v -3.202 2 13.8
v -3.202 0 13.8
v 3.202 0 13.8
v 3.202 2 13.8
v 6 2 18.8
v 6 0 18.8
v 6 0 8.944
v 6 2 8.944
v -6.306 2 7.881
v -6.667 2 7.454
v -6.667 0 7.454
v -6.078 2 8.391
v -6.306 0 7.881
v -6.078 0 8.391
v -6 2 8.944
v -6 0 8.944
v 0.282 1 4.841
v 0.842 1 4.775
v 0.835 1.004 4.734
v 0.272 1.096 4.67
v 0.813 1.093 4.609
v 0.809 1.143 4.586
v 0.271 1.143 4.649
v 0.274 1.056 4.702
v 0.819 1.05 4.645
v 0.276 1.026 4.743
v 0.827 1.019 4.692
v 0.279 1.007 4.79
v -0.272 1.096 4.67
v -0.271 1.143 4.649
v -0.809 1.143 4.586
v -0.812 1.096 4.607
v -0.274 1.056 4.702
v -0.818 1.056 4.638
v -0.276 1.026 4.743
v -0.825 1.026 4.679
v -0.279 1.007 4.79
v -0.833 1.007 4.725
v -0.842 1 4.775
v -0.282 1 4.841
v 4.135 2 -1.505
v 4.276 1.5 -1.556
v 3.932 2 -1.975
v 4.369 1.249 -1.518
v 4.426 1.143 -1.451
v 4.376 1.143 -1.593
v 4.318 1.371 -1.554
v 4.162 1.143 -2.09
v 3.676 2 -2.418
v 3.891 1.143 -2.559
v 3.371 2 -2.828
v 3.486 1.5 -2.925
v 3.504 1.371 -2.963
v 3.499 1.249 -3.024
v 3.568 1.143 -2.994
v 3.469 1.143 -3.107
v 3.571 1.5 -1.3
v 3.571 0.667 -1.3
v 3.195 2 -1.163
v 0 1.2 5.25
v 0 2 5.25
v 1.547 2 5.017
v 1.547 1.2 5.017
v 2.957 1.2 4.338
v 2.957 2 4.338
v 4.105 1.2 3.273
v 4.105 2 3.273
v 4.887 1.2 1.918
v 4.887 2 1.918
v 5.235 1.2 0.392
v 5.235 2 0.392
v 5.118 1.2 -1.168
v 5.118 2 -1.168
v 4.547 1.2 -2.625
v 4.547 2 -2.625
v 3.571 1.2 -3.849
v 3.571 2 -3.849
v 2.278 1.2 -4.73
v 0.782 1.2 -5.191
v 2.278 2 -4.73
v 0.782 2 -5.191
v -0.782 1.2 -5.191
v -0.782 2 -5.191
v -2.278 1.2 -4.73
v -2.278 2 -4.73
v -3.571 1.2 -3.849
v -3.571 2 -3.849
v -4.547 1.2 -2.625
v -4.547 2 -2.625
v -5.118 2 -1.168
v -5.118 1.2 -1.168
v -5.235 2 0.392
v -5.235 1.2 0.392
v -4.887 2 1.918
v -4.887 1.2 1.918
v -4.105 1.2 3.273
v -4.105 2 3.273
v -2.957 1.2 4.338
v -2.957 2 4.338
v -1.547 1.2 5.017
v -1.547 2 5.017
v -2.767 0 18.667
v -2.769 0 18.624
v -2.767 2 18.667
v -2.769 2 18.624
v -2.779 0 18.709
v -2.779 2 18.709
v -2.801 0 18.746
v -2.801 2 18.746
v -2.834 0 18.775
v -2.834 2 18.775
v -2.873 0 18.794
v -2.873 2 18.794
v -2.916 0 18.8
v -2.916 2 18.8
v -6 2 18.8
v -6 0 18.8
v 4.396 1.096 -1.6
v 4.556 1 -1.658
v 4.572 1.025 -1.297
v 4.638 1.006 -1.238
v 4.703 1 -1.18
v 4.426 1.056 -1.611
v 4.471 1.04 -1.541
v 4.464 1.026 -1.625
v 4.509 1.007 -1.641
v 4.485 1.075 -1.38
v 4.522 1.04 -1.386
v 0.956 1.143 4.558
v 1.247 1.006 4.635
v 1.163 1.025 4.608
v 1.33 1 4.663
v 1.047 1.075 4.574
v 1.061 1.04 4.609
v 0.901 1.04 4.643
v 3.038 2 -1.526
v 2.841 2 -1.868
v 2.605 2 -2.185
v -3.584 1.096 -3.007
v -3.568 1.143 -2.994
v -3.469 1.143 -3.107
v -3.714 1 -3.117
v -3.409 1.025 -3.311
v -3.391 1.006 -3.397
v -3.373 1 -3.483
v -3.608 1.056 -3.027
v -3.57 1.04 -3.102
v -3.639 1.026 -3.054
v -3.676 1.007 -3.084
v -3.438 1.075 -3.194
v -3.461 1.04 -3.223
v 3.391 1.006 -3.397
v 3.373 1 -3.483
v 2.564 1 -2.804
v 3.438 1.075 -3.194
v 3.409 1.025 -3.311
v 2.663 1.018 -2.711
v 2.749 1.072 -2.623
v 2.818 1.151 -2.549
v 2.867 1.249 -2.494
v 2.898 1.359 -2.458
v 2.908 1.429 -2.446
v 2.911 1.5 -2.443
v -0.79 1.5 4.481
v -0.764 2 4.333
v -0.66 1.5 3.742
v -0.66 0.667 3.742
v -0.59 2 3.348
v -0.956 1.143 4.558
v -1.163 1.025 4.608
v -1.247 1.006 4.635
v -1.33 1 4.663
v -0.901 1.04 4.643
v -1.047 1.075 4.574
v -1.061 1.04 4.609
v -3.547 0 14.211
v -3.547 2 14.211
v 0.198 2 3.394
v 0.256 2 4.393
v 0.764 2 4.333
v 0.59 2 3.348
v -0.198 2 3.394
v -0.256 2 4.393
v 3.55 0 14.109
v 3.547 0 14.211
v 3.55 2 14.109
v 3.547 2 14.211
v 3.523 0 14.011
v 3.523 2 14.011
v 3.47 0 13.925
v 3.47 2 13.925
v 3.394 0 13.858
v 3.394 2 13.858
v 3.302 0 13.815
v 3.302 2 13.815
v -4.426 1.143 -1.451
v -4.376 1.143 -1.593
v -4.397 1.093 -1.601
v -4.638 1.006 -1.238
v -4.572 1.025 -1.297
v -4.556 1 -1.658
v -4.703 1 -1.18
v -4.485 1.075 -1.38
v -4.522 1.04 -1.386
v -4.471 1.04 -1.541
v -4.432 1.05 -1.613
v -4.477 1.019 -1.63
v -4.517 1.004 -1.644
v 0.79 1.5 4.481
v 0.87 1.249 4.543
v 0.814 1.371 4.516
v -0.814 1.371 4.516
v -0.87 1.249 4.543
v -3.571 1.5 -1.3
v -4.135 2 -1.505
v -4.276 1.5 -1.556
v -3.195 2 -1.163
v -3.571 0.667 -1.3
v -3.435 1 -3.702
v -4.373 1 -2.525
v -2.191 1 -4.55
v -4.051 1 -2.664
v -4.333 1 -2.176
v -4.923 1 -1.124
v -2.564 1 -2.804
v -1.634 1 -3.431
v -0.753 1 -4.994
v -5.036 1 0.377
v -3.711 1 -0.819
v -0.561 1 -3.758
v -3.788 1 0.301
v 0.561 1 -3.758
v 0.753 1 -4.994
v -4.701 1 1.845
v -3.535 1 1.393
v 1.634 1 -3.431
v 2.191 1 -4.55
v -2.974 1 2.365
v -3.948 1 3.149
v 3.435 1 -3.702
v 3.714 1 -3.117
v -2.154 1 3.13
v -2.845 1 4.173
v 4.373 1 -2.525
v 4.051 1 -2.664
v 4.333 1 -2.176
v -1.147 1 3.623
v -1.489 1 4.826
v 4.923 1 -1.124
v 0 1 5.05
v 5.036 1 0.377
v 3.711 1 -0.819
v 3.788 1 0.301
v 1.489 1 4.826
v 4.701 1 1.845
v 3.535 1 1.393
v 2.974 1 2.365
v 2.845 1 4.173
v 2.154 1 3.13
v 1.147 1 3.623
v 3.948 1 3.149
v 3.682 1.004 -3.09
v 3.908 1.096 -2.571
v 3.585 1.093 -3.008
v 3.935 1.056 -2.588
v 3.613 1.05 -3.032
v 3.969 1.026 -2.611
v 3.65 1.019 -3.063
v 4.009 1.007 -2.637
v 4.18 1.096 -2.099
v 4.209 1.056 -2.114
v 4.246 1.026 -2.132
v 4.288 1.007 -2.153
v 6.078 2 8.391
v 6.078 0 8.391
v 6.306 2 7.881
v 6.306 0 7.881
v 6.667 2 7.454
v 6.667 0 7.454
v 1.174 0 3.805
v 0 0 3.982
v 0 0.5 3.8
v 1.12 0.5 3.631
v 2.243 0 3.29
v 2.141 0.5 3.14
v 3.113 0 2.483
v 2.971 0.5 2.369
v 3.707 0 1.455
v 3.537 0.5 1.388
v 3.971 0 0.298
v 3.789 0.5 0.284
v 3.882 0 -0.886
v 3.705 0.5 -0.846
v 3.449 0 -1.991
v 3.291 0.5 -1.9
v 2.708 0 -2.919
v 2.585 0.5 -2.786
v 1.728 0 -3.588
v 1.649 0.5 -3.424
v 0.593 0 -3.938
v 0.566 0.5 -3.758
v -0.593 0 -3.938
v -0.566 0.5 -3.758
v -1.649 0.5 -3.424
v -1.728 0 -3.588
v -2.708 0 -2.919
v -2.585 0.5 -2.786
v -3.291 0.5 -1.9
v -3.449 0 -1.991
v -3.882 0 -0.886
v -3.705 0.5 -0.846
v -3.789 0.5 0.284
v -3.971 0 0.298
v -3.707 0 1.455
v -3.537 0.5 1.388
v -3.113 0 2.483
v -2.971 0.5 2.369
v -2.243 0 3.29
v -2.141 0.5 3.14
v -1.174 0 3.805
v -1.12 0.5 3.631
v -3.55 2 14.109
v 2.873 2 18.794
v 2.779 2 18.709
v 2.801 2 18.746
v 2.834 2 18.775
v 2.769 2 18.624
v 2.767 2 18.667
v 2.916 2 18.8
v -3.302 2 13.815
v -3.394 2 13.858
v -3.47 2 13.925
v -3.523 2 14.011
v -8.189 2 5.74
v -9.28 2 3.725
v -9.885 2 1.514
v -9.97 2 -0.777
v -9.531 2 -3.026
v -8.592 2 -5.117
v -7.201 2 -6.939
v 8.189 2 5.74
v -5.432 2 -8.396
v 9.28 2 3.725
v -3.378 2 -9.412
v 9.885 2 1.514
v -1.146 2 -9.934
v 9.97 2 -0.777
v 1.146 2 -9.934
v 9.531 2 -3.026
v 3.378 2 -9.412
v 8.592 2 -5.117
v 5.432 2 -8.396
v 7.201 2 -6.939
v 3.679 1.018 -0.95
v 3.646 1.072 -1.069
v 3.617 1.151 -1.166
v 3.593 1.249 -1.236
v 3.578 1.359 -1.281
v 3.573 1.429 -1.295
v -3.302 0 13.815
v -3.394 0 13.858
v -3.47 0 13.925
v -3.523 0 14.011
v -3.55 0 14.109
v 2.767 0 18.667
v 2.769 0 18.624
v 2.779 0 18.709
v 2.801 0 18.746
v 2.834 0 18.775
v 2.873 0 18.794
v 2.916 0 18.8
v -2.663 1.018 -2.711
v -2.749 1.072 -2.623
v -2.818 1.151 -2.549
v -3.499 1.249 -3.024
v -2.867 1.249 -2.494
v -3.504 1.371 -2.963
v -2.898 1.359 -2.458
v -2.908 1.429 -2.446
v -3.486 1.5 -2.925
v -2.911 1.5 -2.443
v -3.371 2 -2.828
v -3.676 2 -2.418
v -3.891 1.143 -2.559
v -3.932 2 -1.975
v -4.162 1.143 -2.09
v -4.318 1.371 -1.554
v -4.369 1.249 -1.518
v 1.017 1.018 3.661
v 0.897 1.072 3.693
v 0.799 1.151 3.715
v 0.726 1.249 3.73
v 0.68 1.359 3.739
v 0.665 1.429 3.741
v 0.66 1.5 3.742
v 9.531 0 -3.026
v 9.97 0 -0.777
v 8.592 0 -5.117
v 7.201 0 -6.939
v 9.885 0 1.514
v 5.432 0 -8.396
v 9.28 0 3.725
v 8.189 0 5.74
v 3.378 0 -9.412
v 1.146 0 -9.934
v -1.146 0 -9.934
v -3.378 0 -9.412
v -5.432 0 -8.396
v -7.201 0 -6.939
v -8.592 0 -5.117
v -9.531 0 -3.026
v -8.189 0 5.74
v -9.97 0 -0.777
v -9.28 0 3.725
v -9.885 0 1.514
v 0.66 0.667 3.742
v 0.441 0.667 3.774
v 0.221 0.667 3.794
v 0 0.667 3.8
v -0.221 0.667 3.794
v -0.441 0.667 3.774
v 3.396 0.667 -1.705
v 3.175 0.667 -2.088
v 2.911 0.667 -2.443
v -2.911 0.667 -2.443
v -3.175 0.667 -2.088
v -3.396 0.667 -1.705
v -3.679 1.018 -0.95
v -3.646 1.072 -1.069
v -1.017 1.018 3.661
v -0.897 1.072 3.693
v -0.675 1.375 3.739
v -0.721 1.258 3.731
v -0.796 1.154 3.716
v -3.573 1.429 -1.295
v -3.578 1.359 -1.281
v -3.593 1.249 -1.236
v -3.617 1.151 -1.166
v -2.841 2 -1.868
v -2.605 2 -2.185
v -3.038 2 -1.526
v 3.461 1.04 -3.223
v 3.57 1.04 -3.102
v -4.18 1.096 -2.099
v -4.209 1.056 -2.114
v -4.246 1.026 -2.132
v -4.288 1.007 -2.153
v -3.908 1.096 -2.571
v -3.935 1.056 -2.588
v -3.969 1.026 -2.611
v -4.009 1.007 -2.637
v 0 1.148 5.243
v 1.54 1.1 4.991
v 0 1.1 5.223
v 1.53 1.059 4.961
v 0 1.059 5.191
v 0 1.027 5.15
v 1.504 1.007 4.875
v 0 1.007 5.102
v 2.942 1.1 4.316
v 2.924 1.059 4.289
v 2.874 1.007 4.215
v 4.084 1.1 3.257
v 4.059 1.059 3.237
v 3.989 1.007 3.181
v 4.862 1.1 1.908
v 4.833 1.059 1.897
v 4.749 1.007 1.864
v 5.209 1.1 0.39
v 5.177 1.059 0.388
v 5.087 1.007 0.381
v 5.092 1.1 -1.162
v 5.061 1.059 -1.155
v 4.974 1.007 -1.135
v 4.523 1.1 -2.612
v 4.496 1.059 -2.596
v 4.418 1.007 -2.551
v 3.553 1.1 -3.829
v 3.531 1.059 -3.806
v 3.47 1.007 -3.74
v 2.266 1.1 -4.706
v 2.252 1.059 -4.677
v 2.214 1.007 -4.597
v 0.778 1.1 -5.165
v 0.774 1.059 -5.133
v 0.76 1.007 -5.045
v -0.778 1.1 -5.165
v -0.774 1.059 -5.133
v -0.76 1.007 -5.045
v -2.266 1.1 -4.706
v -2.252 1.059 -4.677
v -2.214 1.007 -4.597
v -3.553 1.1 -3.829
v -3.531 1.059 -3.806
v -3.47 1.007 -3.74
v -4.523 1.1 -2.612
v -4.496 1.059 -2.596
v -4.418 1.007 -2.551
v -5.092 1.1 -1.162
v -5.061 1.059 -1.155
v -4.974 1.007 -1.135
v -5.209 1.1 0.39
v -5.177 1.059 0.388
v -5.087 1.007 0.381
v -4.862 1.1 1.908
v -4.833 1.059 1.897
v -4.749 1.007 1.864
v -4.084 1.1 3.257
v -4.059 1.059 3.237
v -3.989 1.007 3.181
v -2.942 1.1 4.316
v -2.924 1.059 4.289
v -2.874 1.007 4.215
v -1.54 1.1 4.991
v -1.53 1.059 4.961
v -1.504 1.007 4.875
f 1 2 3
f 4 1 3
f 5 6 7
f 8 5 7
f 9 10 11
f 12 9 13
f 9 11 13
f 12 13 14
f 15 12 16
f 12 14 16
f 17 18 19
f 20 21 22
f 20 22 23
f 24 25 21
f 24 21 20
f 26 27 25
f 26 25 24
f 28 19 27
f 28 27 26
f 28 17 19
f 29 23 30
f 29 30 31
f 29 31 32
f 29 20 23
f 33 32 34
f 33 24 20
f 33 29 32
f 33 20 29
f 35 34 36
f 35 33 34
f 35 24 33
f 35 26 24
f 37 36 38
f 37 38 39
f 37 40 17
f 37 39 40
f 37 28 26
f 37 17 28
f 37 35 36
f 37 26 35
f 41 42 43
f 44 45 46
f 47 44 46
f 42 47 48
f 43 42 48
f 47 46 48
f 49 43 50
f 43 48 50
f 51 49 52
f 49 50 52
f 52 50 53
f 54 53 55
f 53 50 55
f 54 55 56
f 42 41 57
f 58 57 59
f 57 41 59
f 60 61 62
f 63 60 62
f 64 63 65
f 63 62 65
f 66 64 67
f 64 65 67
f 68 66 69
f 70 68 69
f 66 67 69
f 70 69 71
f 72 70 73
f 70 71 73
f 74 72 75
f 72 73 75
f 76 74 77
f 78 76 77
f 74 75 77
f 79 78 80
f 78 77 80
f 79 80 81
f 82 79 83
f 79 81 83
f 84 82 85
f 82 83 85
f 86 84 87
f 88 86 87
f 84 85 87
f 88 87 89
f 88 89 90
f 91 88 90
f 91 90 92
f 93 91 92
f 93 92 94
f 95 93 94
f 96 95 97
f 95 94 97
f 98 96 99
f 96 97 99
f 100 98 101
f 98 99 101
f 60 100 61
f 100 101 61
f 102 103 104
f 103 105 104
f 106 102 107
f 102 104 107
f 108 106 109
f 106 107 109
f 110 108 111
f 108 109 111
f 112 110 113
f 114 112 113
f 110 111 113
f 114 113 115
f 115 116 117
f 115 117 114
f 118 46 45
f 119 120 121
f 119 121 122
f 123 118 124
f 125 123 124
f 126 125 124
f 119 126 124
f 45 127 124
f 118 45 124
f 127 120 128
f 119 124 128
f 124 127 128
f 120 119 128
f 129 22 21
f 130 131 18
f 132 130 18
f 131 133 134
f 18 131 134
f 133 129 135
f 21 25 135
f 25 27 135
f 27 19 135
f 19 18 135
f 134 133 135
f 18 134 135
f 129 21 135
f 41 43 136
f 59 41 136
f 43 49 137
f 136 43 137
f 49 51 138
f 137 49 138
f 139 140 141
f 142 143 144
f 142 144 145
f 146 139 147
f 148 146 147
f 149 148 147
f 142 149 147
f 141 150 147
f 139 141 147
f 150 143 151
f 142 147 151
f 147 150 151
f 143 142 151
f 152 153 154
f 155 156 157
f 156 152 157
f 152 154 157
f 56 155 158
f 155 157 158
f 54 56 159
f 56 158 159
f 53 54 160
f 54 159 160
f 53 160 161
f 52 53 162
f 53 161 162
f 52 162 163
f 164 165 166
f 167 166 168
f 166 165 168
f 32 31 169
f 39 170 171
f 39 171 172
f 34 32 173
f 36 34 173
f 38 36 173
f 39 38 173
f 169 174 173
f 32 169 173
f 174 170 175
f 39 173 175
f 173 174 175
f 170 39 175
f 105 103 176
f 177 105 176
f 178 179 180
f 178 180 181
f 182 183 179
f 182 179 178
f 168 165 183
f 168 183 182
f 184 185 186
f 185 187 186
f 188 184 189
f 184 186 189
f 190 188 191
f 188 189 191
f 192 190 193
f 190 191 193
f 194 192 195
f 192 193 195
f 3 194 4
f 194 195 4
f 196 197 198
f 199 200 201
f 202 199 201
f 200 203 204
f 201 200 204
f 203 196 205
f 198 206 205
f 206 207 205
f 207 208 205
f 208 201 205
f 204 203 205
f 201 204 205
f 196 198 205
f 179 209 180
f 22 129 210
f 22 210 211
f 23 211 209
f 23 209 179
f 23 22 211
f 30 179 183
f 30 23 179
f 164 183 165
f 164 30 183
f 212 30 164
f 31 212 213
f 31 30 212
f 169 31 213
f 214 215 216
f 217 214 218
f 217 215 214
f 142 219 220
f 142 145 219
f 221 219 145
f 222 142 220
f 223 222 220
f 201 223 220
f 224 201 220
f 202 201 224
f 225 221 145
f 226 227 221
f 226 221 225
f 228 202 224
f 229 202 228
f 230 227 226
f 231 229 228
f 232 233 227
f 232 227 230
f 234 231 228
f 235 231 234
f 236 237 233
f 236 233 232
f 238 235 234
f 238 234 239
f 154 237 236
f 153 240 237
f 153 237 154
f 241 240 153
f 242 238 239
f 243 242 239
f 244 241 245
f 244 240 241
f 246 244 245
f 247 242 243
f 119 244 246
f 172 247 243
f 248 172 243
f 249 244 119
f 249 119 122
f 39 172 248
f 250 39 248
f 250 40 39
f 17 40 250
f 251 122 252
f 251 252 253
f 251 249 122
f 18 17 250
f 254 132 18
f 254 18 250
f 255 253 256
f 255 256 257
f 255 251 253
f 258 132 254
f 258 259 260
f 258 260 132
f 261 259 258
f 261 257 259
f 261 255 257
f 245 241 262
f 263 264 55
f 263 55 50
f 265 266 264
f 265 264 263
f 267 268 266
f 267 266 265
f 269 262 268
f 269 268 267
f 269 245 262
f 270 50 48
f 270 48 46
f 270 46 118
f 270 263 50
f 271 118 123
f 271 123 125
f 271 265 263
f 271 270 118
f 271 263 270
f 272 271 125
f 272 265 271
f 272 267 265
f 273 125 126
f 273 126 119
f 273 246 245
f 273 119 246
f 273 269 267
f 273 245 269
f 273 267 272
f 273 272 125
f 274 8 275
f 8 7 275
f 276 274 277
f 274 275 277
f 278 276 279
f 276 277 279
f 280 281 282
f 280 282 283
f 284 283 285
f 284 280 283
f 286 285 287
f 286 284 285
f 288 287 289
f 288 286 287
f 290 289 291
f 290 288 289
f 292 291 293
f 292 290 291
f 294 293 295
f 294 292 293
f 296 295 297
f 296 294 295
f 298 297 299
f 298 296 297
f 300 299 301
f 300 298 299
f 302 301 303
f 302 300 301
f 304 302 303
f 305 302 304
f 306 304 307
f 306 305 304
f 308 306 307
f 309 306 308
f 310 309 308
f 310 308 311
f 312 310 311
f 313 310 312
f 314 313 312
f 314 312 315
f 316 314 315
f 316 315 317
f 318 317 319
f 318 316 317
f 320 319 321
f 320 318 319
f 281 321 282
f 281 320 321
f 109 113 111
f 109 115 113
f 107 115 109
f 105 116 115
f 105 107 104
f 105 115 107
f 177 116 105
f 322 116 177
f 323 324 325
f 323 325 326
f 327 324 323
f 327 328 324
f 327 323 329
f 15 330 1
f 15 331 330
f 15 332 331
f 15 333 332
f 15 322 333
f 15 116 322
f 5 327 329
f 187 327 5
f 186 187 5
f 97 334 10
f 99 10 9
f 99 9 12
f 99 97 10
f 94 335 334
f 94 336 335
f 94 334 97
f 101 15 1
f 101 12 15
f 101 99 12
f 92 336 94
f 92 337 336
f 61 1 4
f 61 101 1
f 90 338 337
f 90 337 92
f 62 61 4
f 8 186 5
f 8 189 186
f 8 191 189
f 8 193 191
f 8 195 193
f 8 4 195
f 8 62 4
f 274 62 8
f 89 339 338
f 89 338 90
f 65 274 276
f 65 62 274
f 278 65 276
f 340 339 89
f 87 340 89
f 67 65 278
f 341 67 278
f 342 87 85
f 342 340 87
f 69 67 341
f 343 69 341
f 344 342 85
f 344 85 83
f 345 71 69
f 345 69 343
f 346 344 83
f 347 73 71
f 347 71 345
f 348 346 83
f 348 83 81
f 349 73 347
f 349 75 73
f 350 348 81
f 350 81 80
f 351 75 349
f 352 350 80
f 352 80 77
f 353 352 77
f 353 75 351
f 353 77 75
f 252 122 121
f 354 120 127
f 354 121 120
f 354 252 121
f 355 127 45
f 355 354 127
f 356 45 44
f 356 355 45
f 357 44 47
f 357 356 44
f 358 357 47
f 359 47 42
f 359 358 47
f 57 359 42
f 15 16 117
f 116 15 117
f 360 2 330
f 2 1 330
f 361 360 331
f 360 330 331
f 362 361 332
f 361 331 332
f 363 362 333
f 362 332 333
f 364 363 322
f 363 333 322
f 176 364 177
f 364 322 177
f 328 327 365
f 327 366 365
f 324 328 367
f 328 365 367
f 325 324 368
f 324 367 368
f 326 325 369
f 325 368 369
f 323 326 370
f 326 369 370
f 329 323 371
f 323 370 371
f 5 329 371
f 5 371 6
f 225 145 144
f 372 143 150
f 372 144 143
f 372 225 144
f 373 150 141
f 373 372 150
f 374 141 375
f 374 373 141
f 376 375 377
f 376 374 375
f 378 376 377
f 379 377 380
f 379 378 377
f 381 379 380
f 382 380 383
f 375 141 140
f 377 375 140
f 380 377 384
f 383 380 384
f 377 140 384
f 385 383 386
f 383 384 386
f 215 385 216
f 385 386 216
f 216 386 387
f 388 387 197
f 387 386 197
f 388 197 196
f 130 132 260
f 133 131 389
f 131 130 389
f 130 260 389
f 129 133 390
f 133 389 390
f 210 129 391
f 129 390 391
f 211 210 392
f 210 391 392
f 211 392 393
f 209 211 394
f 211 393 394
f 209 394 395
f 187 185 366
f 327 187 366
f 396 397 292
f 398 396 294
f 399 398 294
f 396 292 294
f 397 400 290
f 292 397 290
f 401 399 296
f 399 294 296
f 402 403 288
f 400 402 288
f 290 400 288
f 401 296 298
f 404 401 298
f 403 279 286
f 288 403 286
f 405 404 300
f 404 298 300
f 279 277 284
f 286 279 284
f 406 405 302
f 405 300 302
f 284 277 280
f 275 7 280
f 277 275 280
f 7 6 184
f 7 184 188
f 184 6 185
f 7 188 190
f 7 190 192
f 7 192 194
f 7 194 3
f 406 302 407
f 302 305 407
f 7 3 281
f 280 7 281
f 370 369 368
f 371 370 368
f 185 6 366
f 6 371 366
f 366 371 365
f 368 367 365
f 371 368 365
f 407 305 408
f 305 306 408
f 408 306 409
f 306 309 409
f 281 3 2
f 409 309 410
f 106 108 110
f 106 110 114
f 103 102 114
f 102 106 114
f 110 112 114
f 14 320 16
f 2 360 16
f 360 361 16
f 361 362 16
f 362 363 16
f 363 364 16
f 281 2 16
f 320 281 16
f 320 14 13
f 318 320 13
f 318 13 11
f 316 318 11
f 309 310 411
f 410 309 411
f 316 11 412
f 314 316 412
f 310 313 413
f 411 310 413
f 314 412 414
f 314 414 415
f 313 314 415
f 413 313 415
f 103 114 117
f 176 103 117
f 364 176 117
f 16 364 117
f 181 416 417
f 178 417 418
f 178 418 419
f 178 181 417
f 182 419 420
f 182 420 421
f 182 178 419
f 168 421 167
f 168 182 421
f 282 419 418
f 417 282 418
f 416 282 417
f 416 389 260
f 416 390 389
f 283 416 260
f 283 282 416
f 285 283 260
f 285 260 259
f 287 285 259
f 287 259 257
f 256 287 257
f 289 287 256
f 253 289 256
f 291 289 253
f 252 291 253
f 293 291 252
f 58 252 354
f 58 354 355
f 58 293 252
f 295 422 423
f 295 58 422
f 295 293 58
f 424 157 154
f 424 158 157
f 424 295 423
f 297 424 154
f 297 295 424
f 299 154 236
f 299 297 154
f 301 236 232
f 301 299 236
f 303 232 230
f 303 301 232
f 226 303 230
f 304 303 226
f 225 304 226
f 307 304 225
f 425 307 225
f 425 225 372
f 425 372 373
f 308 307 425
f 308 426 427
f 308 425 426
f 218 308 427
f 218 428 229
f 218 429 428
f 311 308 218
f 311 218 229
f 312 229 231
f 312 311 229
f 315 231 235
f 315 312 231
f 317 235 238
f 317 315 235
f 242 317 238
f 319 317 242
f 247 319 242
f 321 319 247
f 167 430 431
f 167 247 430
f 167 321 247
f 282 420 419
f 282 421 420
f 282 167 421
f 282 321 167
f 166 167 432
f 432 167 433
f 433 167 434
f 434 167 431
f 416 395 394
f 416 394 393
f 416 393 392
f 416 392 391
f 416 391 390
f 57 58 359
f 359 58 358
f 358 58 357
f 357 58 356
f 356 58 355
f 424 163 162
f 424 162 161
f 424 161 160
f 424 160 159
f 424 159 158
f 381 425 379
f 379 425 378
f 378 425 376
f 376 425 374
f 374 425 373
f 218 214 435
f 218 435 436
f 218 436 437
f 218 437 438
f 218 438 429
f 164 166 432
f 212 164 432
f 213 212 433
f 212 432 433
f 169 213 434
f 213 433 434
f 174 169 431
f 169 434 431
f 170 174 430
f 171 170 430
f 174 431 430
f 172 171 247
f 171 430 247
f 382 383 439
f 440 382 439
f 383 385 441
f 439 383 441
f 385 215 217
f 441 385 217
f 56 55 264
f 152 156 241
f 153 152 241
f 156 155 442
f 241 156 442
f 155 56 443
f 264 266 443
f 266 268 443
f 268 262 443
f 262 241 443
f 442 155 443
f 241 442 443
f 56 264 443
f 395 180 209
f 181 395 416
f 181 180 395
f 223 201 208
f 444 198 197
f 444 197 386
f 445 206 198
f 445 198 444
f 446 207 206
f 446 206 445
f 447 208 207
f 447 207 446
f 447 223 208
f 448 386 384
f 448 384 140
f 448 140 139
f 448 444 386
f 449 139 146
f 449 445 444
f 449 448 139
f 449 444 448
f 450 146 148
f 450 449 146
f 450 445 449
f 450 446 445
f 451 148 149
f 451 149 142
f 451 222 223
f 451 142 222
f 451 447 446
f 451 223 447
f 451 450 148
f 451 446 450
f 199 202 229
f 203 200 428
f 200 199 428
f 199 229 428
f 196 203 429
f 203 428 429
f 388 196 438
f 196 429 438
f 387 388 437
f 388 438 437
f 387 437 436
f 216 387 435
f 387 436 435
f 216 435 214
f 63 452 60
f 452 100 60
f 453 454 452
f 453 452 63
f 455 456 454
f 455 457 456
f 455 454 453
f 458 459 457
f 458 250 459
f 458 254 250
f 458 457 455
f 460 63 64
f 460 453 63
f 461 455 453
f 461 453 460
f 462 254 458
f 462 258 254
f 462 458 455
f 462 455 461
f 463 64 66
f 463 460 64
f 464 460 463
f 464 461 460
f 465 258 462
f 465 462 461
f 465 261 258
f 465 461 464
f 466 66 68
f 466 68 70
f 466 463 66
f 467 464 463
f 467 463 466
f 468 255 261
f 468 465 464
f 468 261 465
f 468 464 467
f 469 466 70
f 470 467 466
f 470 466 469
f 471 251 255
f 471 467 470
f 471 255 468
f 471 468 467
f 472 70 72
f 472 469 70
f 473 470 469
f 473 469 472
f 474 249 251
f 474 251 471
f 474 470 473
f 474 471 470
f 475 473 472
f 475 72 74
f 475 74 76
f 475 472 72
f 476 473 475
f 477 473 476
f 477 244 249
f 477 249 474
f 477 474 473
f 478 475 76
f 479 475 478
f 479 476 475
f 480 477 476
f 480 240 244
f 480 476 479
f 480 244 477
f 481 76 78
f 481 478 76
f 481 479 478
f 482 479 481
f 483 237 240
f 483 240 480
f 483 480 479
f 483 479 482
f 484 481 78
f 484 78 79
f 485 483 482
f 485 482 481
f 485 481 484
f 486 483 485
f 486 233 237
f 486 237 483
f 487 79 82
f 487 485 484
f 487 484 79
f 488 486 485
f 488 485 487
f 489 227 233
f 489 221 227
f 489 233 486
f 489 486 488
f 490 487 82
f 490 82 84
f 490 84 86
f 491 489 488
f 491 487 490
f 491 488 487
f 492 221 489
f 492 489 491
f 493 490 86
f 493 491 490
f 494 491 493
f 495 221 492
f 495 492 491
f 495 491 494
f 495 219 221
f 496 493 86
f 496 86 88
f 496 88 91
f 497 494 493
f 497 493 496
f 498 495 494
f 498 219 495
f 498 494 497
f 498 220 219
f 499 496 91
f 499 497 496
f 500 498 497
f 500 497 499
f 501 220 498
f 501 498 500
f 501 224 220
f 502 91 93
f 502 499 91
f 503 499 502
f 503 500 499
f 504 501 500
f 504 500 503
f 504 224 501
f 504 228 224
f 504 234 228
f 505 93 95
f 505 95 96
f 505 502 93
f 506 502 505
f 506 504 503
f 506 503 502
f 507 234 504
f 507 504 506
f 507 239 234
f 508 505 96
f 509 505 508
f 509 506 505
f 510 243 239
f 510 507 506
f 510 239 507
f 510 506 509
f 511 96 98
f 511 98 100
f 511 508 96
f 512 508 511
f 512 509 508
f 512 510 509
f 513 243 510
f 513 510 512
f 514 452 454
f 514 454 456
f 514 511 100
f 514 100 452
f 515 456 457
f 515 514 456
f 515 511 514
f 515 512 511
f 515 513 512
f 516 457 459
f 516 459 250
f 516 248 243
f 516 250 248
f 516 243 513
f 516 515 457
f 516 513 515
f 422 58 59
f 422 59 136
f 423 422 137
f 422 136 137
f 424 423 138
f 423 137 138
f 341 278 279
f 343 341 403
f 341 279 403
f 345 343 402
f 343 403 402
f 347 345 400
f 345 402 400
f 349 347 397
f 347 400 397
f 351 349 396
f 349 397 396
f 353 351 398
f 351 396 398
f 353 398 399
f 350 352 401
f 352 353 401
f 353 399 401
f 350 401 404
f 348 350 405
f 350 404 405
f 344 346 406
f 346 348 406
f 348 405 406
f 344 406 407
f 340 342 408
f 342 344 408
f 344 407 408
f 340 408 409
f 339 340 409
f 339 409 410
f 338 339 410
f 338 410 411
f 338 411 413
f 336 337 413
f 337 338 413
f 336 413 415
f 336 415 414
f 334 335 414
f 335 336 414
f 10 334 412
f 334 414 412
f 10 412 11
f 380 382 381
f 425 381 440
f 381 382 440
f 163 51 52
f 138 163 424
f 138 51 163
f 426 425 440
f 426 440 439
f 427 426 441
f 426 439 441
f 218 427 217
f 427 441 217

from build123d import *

# Parameters (mm, degrees)
SKETCH1_R           = 4
BOSS_EXTRUDE1_DEPTH = 2
SKETCH2_R           = 10
SKETCH2_R_2         = 3.8
BOSS_EXTRUDE2_DEPTH = 2
SKETCH4_W           = 12
SKETCH4_H           = 0.2
CUT_EXTRUDE1_DEPTH  = 4
FILLET3_R           = 0.35
FILLET4_R           = 0.15
FILLET6_R           = 2
SKETCH13_R          = 5.25
CUT_EXTRUDE5_DEPTH  = 1
REVOLVE2_ANGLE      = 20
CIRPATTERN2_COUNT   = 3
CHAMFER1_SIZE       = 0.5
CHAMFER1_SIZE2      = 0.181985117
FILLET13_R          = 0.5
FILLET14_R          = 0.2


with BuildPart() as part:
    # Sketch1 → Boss-Extrude1 (new body)
    with BuildSketch(Plane(origin=(0, 0, 0), x_dir=(1, 0, 0), z_dir=(0, 1, 0))):
        Polygon((-6, 6), (-6, -13.291502622), (-6, -19), (-2.70227506, -19), (-3.619175359, -13.8), (0, -13.8), (3.619175359, -13.8), (2.70227506, -19), (6, -19), (6, -13.291502622), (6, 6), align=None)
        with Locations(Location((0, 0, 0), (0, 0, 270))):
            Circle(SKETCH1_R, mode=Mode.SUBTRACT)
    extrude(amount=BOSS_EXTRUDE1_DEPTH)

    # Sketch2 → Boss-Extrude2 (add)
    with BuildSketch(Plane(origin=(0, 0, 0), x_dir=(1, 0, 0), z_dir=(0, 1, 0))):
        Circle(SKETCH2_R)
        with Locations(Location((0, 0, 0), (0, 0, 270))):
            Circle(SKETCH2_R_2, mode=Mode.SUBTRACT)
    extrude(amount=BOSS_EXTRUDE2_DEPTH)

    # Sketch4 → Cut-Extrude1 (cut)
    with BuildSketch(Plane(origin=(0, 2, 0), x_dir=(1, 0, 0), z_dir=(0, 1, 0))):
        with Locations((0, -18.9)):
            Rectangle(SKETCH4_W, SKETCH4_H)
    extrude(amount=-CUT_EXTRUDE1_DEPTH, mode=Mode.SUBTRACT)

    # Fillet3
    fillet3_edges = [part.edges().sort_by_distance(p)[0] for p in [
        (3.619175359, 1, 13.8),
        (-3.619175359, 1, 13.8),
    ]]
    fillet(fillet3_edges, radius=FILLET3_R)

    # Fillet4
    fillet4_edges = [part.edges().sort_by_distance(p)[0] for p in [
        (2.737540456, 1, 18.8),
        (-2.737540456, 1, 18.8),
    ]]
    fillet(fillet4_edges, radius=FILLET4_R)

    # Fillet6
    fillet6_edges = [part.edges().sort_by_distance(p)[0] for p in [
        (6, 1, 8),
        (-6, 1, 8),
    ]]
    fillet(fillet6_edges, radius=FILLET6_R)

    # Sketch13 → Cut-Extrude5 (cut)
    with BuildSketch(Plane(origin=(0, 2, 0), x_dir=(1, 0, 0), z_dir=(0, 1, 0))):
        with Locations(Location((0, 0, 0), (0, 0, 270))):
            Circle(SKETCH13_R)
    extrude(amount=-CUT_EXTRUDE5_DEPTH, mode=Mode.SUBTRACT)

    # Sketch12 → Revolve2 (revolve, symmetric)
    with BuildSketch(Plane(origin=(0, 0, 0), x_dir=(0, 0, -1), z_dir=(1, 0, 0))) as revolve2_sk:
        Polygon((-4, 0), (-3.4, 2), (-4.4, 2), (-5, 0), align=None)
    revolve2 = revolve(axis=Axis((0, 0, 0), (0, 1, 0)), revolution_arc=REVOLVE2_ANGLE / 2)
    revolve2 = revolve2 + revolve(revolve2_sk.sketch, axis=Axis((0, 0, 0), (0, -1, 0)), revolution_arc=REVOLVE2_ANGLE / 2)

    # CirPattern2: Revolve2 ×3 about axis
    cirpattern2_axis = Axis((0, 0, 0), (0, 1, 0))
    for i in range(1, CIRPATTERN2_COUNT):
        add(revolve2.rotate(cirpattern2_axis, i * 360 / CIRPATTERN2_COUNT))

    # Chamfer1
    chamfer1_edges = [part.edges().sort_by_distance(p)[0] for p in [
        (0, 0, -3.8),
    ]]
    chamfer1_side = [part.faces().sort_by_distance(p)[0] for p in [
        (0, 0.5, -3.8),
    ]]
    chamfer(chamfer1_edges, length=CHAMFER1_SIZE, length2=CHAMFER1_SIZE2, reference=chamfer1_side[0])

    # Fillet13
    fillet13_edges = [part.edges().sort_by_distance(p)[0] for p in [
        (-0.738004755, 1, 4.18543295),
        (0.738004755, 1, 4.18543295),
        (-3.255688883, 1, -2.731847341),
        (-3.993693638, 1, -1.453585609),
        (3.993693638, 1, -1.453585609),
        (3.255688883, 1, -2.731847341),
    ]]
    fillet(fillet13_edges, radius=FILLET13_R)

    # Fillet14
    fillet14_edges = [part.edges().sort_by_distance(p)[0] for p in [
        (0, 1, -5.25),
        (-4.070319398, 1, -2.35),
        (4.070319398, 1, -2.35),
        (0, 1, 4.7),
    ]]
    fillet(fillet14_edges, radius=FILLET14_R)


solid = part.part
